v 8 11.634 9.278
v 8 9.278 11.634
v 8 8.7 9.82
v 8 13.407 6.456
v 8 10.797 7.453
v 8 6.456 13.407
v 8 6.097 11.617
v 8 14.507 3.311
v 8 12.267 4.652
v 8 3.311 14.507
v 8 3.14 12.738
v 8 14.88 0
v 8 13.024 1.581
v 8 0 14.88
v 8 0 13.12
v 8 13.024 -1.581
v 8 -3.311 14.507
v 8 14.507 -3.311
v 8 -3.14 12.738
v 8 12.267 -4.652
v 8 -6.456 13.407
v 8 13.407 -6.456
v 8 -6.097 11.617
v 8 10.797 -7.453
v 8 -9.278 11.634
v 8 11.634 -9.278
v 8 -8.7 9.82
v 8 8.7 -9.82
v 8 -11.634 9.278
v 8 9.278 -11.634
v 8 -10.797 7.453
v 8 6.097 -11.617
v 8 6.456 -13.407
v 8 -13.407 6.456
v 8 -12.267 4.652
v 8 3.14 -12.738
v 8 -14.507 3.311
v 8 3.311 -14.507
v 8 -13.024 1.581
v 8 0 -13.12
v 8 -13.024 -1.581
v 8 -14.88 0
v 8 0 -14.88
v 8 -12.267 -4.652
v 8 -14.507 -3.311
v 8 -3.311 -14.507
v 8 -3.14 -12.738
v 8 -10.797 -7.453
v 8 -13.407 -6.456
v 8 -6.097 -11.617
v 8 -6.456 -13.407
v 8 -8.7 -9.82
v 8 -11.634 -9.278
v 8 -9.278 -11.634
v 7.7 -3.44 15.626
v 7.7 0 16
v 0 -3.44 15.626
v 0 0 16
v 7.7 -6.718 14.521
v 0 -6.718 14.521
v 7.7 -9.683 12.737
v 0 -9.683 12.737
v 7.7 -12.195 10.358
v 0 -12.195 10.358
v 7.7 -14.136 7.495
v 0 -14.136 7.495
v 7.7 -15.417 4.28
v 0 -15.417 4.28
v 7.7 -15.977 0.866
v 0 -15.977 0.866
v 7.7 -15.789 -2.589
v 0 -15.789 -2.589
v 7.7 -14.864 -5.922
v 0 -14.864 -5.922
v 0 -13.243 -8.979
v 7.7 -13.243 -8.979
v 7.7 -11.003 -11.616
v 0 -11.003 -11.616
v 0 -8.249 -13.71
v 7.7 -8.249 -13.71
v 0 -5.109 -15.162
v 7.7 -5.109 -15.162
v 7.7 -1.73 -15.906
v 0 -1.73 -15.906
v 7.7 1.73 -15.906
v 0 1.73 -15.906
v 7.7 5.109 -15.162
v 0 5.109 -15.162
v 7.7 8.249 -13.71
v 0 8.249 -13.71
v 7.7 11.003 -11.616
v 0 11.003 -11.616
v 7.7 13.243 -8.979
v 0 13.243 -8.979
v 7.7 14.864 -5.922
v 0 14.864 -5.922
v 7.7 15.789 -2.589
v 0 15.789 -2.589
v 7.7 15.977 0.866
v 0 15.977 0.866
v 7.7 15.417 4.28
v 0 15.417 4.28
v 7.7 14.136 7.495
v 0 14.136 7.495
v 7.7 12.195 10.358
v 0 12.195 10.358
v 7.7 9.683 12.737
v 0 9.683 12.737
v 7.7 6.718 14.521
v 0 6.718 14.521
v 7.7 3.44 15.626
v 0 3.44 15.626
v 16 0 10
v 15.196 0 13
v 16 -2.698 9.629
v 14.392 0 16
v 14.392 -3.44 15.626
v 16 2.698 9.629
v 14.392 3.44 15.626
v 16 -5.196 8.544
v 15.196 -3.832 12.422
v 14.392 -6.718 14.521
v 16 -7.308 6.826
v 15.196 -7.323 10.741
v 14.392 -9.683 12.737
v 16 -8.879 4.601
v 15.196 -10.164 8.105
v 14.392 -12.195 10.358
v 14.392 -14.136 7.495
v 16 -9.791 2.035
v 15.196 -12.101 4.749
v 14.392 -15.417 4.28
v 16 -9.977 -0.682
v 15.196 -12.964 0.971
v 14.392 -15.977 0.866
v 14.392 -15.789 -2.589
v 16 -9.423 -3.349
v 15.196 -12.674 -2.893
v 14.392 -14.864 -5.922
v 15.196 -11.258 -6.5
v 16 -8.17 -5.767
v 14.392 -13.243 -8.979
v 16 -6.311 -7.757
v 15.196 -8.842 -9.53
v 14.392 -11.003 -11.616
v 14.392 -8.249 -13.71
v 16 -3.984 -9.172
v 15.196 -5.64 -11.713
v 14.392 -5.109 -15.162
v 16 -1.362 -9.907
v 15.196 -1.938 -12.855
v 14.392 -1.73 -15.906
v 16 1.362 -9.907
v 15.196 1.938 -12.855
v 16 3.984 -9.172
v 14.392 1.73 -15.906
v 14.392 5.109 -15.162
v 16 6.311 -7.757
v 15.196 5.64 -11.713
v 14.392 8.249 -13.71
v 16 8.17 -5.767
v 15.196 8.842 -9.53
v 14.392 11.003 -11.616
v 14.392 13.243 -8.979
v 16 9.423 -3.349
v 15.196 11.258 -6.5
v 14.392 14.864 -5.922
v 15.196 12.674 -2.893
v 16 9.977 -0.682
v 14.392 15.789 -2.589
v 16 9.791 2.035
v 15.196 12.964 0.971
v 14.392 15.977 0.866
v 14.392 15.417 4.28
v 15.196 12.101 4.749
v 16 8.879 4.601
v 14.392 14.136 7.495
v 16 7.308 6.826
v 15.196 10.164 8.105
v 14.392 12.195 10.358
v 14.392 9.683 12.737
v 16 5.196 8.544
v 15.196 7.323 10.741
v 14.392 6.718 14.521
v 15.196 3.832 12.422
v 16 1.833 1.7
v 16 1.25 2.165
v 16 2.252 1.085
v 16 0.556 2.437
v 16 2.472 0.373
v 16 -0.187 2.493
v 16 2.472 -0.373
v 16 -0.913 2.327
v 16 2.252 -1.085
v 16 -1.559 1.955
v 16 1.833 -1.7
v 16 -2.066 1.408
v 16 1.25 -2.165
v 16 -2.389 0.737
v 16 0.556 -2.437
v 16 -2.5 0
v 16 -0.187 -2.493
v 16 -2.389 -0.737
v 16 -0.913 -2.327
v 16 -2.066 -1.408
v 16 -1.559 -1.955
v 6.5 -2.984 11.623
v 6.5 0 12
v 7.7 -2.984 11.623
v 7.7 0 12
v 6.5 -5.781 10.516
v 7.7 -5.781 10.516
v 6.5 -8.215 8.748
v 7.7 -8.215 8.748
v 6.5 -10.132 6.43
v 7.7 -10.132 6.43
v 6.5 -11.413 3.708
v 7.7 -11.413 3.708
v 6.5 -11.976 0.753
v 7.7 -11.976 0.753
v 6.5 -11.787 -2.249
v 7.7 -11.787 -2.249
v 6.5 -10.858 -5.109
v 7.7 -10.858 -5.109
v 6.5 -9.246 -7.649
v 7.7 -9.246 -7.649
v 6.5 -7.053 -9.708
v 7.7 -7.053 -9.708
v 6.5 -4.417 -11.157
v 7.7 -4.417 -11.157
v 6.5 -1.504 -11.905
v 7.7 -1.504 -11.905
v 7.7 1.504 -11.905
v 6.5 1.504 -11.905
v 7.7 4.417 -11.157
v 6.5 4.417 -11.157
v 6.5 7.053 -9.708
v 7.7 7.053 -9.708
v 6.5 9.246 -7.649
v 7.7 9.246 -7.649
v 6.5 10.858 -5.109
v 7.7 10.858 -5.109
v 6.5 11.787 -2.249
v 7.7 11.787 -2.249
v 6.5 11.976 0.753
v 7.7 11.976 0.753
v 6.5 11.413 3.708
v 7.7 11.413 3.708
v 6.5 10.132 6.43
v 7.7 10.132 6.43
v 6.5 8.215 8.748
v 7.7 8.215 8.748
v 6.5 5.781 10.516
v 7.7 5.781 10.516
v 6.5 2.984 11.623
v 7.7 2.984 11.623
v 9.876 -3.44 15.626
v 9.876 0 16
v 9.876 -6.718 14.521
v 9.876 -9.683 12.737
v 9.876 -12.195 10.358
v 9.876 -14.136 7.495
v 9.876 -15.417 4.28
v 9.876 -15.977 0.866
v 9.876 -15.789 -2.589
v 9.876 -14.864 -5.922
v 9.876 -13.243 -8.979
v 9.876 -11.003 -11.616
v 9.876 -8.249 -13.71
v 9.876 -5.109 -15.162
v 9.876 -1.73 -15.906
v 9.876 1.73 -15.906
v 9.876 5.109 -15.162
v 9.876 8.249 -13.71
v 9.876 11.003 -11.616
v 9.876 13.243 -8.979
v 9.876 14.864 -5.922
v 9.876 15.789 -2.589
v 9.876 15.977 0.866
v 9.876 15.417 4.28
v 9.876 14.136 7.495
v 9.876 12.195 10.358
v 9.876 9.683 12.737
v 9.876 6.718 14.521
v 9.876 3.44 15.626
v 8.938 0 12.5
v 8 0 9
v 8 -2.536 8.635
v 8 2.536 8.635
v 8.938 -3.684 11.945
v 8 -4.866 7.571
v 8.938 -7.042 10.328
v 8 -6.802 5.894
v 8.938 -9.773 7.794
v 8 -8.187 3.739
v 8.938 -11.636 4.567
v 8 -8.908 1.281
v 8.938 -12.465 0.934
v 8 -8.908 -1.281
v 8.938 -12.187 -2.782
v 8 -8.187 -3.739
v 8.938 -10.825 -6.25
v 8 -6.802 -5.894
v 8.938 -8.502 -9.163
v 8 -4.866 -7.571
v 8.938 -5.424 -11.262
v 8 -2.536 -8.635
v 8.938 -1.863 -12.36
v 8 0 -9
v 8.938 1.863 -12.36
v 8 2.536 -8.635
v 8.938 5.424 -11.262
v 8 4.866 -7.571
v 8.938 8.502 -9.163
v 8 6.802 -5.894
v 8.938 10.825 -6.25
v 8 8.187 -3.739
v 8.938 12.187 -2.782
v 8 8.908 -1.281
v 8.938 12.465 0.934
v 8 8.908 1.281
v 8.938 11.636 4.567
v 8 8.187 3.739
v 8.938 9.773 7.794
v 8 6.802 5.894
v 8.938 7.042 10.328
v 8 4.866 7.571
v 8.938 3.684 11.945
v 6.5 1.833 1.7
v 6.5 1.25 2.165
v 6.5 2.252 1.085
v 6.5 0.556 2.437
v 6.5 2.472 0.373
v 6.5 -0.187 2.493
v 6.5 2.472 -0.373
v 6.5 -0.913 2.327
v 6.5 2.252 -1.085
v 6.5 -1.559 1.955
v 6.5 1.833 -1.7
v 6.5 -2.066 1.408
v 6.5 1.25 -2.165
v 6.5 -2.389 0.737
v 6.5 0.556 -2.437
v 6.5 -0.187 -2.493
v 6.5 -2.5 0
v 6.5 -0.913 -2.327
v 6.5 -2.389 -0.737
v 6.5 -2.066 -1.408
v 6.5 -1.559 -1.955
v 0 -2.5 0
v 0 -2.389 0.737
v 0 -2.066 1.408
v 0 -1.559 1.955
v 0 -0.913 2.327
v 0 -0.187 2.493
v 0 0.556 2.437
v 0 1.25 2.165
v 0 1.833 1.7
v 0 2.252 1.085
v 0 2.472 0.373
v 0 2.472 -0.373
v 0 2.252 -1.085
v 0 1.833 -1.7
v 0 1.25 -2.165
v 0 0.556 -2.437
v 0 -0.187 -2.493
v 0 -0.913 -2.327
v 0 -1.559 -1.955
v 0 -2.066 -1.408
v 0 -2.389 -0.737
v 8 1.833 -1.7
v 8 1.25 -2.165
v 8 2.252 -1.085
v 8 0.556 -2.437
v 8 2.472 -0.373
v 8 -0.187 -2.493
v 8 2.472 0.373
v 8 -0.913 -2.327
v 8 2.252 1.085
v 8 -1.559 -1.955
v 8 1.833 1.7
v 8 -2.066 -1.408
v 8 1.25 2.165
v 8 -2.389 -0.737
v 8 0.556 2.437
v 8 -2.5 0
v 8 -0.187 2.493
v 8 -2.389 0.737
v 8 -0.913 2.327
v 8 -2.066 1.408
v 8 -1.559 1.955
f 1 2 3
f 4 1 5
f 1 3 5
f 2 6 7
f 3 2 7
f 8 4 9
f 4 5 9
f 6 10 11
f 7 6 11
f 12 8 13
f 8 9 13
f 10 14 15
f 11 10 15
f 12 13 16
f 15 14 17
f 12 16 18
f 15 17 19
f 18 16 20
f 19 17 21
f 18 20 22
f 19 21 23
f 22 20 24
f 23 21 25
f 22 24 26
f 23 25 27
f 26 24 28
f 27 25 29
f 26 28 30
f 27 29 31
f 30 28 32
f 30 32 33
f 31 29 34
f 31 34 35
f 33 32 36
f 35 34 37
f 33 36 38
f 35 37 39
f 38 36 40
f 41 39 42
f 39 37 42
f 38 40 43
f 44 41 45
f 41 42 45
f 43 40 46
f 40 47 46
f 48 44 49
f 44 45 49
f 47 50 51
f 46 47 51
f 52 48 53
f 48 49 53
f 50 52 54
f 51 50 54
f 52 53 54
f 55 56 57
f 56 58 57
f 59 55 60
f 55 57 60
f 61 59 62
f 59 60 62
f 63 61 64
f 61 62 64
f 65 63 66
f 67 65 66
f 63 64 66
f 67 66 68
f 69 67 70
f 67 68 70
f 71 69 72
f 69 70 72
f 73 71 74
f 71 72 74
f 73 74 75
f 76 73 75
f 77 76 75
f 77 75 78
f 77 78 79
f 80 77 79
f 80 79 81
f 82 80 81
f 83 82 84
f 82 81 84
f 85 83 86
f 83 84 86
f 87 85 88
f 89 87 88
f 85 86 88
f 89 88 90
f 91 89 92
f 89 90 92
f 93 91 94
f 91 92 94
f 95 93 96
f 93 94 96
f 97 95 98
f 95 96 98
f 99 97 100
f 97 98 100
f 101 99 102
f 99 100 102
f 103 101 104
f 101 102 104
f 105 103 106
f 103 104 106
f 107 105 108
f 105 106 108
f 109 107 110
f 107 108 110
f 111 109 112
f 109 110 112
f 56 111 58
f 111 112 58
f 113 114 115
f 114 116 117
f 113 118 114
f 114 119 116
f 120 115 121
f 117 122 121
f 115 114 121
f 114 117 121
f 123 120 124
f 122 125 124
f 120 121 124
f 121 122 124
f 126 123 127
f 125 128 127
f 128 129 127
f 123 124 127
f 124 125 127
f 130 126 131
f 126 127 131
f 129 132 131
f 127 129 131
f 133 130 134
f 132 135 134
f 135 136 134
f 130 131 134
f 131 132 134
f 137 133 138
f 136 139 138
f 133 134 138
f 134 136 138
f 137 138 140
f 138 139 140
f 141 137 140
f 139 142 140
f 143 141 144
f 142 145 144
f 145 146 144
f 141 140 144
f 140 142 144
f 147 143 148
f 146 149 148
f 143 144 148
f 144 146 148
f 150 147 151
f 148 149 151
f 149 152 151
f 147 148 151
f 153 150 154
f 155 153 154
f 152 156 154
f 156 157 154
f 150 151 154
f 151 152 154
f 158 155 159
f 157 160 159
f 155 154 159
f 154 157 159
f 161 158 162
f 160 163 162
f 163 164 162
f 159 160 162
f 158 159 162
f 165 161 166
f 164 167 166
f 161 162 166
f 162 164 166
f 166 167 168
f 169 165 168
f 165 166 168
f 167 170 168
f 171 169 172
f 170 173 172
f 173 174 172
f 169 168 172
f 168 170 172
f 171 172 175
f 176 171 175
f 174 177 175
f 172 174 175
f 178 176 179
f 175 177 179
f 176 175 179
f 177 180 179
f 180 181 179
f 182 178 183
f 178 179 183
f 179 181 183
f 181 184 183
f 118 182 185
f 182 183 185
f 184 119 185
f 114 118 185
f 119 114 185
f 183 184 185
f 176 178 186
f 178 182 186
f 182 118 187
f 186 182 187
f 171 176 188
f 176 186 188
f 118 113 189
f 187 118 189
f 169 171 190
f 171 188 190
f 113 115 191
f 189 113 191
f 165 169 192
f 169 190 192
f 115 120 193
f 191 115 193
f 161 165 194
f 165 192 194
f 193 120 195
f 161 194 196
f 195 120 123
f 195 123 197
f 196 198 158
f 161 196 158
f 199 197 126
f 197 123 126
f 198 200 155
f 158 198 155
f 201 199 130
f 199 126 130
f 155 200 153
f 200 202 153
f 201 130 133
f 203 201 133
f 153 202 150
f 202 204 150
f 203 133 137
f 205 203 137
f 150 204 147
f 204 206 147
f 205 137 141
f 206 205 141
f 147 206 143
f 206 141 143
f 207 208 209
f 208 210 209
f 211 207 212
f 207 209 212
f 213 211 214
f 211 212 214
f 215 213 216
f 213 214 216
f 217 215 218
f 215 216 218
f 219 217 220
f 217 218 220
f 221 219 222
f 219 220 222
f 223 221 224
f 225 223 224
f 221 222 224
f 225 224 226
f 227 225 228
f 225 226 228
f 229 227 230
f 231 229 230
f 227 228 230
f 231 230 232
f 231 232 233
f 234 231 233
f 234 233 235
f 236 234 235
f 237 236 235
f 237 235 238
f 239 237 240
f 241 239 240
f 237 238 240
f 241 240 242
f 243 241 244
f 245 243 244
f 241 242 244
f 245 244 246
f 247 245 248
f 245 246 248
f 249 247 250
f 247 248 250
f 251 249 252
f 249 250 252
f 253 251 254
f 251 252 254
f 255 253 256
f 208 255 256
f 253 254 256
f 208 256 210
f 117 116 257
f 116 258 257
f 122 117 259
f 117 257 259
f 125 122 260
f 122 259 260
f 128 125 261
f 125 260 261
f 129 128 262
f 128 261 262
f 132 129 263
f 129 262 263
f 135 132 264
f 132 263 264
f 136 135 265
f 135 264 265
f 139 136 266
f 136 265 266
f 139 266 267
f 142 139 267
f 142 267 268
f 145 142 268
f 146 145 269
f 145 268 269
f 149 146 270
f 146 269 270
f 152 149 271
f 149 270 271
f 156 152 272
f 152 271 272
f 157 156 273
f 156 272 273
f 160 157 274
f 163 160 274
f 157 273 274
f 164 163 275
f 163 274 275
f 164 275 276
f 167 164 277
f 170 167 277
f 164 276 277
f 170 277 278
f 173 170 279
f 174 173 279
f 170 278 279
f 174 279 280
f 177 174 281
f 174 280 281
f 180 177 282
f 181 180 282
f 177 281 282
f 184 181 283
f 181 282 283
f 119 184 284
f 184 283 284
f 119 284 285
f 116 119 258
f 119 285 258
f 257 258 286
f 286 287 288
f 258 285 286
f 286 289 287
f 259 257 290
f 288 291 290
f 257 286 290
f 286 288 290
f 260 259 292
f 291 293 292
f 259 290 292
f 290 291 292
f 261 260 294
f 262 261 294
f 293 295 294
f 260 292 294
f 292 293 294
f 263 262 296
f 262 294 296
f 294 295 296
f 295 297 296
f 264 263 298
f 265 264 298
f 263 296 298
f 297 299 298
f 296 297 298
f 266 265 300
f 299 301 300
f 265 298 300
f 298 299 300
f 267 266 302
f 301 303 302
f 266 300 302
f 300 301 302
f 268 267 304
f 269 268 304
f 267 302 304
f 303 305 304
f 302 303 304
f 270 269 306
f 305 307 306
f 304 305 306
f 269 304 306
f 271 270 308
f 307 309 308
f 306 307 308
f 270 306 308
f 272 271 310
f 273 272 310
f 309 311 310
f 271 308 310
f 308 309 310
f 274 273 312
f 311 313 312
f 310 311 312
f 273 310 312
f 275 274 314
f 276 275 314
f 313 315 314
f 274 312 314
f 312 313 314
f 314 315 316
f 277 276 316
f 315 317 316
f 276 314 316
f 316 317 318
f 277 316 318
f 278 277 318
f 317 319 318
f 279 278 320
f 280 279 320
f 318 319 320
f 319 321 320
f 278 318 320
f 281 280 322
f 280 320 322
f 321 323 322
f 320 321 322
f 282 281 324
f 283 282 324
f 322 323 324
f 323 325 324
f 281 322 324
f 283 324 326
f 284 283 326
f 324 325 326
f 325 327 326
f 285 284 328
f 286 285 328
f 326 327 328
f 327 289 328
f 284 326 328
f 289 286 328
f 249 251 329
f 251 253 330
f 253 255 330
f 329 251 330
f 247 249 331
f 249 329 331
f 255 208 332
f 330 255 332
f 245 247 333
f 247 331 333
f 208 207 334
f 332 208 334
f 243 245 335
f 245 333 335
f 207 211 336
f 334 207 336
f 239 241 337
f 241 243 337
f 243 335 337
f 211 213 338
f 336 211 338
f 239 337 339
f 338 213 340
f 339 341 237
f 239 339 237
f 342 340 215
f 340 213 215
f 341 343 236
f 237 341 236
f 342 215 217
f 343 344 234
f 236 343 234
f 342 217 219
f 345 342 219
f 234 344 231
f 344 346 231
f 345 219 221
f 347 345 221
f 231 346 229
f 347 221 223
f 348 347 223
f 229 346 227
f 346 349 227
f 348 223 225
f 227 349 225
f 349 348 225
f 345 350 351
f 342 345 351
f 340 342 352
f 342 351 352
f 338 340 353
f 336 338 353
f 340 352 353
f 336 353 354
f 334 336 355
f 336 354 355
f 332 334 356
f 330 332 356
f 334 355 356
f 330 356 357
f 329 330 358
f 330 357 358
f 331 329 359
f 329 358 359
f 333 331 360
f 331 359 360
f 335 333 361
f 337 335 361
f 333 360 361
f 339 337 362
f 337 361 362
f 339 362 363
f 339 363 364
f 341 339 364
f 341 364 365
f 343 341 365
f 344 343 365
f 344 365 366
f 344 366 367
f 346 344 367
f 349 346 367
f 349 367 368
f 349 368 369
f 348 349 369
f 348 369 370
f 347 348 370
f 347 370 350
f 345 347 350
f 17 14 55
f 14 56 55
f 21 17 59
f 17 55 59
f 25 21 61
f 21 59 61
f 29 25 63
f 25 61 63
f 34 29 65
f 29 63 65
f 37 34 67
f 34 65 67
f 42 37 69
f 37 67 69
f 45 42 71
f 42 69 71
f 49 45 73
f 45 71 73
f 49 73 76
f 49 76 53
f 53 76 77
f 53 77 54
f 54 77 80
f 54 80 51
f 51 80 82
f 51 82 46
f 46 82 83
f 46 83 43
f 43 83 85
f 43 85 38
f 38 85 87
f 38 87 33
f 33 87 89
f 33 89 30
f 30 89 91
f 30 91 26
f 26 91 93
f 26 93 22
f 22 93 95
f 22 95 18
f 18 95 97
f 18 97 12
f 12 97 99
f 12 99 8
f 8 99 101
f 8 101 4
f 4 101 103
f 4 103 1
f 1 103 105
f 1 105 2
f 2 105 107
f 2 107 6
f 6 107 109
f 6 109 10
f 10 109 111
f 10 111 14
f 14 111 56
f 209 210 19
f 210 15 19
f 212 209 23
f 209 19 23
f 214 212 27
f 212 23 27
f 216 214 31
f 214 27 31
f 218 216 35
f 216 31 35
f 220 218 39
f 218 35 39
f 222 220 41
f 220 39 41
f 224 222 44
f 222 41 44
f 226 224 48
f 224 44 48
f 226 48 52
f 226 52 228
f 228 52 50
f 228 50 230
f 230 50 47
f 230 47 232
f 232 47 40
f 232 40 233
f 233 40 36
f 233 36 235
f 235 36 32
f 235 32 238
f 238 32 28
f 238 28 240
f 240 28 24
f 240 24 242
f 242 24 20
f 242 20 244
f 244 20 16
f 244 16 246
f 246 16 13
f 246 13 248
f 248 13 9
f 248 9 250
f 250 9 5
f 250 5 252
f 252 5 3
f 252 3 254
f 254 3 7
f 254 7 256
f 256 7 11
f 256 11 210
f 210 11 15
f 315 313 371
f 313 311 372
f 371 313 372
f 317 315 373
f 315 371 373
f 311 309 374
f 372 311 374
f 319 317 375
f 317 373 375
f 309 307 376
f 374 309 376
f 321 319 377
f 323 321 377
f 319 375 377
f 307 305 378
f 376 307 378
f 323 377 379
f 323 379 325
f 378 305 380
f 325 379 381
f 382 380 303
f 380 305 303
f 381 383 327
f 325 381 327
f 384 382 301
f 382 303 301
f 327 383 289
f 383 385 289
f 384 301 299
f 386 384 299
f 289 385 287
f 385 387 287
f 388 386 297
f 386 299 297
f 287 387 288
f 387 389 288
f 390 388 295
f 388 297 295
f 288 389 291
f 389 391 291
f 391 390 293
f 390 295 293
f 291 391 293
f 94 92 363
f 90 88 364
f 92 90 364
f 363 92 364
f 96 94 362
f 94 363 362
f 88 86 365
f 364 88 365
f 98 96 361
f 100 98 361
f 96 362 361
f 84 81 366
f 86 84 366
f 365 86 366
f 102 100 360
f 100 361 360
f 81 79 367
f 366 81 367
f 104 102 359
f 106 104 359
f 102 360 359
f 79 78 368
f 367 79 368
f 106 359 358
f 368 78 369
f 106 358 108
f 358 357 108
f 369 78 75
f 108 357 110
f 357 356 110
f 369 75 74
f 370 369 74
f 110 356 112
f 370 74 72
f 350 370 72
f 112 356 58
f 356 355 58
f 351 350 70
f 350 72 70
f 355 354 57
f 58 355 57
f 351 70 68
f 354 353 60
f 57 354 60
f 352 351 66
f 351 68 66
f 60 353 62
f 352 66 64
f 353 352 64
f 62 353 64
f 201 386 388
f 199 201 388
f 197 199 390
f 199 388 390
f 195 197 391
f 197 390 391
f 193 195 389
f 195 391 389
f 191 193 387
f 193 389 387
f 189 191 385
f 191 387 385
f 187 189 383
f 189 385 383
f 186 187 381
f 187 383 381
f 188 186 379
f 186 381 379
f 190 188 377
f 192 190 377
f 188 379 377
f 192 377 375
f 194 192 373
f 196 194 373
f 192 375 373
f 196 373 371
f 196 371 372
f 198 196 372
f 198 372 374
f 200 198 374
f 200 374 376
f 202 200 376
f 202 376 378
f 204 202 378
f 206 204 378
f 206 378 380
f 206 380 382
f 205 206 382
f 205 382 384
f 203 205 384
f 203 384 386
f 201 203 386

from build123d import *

# Parameters (mm, degrees)
F4_D   = 5
F4_2_D = 5


with BuildPart() as f1:
    # F0 (on Front) → F1 (revolve)
    with BuildSketch(Plane.XZ):
        Polygon((0, 16), (0, 3), (0, 0), (6.5, 0), (6.5, 6), (6.5, 12), (7.7, 12), (8, 13.1196152423), (8, 14.8803847577), (7.7, 16), align=None)
    revolve(axis=Axis((4, 0, 0), (1, 0, 0)))

    # F4 (through all)
    with Locations(Plane.YZ.offset(16)):
        with Locations((0, 0)):
            Hole(F4_D / 2)


with BuildPart() as f2:
    # F0 (on Front) → F2 (revolve)
    with BuildSketch(Plane.XZ):
        Polygon((8, 6), (8, 0), (16, 0), (16, 10), (14.3923048454, 16), (9.875644347, 16), (8, 9), align=None)
    revolve(axis=Axis((12, 0, 0), (1, 0, 0)))

    # F4#2 (through all)
    with Locations(Plane.YZ.offset(16)):
        with Locations((0, 0)):
            Hole(F4_2_D / 2)


solid = Compound([f1.part, f2.part])
